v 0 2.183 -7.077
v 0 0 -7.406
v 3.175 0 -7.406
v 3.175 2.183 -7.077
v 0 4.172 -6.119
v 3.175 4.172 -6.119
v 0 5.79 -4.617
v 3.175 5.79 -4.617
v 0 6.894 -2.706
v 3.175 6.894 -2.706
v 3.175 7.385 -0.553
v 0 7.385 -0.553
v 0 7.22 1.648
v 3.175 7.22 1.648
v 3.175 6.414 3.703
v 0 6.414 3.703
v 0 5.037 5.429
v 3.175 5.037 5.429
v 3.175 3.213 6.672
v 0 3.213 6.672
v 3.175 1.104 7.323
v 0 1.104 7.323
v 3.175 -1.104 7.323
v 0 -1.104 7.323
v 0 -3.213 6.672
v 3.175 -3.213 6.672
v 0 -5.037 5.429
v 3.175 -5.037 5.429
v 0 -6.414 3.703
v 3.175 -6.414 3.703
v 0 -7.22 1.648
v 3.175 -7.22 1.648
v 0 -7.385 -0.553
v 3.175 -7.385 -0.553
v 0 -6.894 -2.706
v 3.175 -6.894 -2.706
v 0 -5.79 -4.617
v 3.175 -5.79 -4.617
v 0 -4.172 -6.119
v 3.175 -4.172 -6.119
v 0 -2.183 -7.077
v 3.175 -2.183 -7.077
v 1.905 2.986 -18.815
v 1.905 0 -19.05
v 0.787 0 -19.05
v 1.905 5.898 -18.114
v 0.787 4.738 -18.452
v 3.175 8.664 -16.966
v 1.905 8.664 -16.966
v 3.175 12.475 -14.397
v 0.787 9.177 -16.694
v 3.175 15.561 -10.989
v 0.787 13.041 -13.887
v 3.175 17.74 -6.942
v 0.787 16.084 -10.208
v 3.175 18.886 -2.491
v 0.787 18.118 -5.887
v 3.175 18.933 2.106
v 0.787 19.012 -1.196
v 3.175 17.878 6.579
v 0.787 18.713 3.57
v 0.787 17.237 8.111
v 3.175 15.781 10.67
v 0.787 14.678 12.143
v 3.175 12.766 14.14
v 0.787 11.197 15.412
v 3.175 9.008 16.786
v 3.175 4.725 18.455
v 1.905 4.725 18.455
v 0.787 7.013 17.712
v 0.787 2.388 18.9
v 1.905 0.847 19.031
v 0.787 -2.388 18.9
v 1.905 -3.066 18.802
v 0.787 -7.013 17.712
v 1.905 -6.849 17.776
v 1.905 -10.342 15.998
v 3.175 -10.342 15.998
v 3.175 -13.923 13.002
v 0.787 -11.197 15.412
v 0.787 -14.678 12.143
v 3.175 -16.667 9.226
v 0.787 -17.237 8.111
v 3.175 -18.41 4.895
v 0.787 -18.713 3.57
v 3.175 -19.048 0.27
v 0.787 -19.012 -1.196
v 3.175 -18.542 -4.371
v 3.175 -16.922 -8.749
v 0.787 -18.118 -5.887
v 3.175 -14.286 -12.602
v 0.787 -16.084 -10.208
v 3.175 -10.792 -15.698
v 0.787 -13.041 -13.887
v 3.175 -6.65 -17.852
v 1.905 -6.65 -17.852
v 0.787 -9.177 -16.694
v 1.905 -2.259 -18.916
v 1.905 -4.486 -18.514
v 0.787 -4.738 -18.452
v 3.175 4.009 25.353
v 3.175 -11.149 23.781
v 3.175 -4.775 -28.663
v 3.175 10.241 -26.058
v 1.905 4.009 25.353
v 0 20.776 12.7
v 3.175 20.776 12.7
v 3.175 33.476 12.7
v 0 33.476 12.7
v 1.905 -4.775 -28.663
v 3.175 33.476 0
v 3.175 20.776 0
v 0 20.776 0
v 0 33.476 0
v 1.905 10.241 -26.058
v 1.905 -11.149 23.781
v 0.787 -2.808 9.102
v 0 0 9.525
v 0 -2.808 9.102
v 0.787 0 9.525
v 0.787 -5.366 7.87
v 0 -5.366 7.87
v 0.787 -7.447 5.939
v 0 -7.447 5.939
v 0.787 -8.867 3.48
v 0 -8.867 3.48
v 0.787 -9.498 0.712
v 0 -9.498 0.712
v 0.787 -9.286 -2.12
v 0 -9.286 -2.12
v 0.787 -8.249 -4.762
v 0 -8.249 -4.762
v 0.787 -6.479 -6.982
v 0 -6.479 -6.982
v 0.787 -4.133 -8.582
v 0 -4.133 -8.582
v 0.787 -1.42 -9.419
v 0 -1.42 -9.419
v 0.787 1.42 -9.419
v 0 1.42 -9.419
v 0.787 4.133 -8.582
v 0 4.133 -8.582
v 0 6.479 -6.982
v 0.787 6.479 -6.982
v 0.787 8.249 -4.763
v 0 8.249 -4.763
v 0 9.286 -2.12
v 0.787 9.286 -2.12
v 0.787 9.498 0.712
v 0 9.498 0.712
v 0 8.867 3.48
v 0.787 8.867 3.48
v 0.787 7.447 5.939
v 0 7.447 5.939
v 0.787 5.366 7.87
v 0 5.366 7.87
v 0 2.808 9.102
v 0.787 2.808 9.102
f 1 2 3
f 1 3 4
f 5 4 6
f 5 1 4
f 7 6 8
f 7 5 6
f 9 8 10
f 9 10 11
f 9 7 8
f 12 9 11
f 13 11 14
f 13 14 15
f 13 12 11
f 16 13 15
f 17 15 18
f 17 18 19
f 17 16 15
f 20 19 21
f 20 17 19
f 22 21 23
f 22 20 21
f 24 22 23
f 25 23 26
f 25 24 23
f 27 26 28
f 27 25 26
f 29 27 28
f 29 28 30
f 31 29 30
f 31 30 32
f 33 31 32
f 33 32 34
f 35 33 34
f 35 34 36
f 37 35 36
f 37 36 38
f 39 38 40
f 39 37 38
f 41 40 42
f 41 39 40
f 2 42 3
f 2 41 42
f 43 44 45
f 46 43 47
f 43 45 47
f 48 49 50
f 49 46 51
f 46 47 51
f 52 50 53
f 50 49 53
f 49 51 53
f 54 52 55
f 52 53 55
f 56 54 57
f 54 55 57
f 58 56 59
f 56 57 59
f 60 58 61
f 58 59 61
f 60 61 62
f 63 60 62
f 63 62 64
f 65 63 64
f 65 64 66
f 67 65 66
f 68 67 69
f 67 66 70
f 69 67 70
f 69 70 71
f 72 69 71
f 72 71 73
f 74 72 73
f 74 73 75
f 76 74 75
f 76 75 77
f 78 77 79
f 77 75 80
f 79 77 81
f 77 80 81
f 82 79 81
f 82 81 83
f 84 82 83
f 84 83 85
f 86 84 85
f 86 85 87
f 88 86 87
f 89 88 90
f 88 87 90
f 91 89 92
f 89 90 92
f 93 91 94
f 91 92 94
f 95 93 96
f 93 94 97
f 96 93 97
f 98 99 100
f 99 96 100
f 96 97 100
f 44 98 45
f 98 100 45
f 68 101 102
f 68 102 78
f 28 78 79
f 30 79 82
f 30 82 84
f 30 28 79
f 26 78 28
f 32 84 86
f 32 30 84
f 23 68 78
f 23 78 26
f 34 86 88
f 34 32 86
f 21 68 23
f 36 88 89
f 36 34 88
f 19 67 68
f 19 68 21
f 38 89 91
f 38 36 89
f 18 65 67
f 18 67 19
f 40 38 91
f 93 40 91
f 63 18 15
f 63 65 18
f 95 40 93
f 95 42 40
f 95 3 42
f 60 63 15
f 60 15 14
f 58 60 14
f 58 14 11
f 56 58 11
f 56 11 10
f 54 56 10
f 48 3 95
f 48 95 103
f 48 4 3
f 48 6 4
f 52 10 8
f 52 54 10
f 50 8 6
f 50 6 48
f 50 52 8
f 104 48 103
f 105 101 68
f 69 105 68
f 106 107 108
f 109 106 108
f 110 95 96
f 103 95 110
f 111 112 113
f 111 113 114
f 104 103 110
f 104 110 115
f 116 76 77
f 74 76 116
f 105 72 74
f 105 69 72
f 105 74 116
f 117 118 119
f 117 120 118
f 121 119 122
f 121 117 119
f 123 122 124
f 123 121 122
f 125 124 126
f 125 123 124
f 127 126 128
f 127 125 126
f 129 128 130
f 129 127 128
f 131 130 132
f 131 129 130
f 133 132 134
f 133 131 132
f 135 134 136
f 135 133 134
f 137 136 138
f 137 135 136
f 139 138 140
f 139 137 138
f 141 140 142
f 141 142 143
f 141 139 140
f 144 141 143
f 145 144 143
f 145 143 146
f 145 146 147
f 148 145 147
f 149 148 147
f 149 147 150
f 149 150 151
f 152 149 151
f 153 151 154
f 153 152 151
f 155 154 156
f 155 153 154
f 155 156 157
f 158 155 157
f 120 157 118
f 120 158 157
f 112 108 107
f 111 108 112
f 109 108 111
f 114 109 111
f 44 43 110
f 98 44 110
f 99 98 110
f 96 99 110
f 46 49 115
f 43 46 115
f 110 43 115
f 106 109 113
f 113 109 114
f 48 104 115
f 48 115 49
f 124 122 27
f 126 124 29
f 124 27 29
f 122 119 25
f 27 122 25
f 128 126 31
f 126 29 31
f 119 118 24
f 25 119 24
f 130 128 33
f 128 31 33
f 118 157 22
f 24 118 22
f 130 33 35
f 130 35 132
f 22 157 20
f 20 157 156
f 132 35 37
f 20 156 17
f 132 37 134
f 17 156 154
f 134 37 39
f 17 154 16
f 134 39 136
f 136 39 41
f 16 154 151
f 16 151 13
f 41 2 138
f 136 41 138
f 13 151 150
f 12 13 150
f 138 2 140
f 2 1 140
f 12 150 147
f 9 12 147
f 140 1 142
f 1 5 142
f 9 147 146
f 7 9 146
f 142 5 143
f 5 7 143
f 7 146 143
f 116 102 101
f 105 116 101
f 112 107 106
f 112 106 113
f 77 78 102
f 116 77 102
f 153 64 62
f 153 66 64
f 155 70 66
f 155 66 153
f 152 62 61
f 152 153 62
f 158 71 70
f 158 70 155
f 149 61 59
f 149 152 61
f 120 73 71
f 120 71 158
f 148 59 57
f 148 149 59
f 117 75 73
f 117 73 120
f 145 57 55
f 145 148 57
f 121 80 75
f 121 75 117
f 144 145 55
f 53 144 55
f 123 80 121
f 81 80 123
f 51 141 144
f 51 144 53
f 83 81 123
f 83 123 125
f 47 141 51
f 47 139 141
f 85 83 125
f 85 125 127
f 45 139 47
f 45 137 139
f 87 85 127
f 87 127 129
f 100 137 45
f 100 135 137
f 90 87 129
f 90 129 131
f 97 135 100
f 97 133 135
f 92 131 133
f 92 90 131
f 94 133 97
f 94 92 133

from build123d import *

# Parameters (mm, degrees)
SKETCH1_R           = 19.05
SKETCH1_R_2         = 7.405671903
BOSS_EXTRUDE1_DEPTH = 3.175
SKETCH3_W           = 0.7874
SKETCH3_H           = 9.525
SKETCH4_W           = 12.7
SKETCH4_H           = 12.7
BOSS_EXTRUDE2_DEPTH = 3.175
BOSS_EXTRUDE3_DEPTH = 1.27


with BuildPart() as part:
    # Sketch1 → Boss-Extrude1 (new body)
    with BuildSketch(Plane(origin=(0, 0, 0), x_dir=(0, 0, -1), z_dir=(1, 0, 0))):
        Circle(SKETCH1_R)
        Circle(SKETCH1_R_2, mode=Mode.SUBTRACT)
    extrude(amount=BOSS_EXTRUDE1_DEPTH)

    # Sketch3 → Cut-Revolve1 (revolve, cut)
    with BuildSketch(Plane.XY, mode=Mode.PRIVATE) as cut_revolve1_sk:
        with Locations((0.3937, 14.2875)):
            Rectangle(SKETCH3_W, SKETCH3_H)
    revolve(cut_revolve1_sk.sketch.rotate(Axis((0, 0, 0), (1, 0, 0)), 90), axis=Axis((0, 0, 0), (1, 0, 0)), mode=Mode.SUBTRACT)

    # Sketch5 → Boss-Extrude3 (add)
    with BuildSketch(Plane(origin=(3.175, 0, 0), x_dir=(0, 0, -1), z_dir=(1, 0, 0))):
        Polygon((12.603193196, 7.906953093), (15.207933879, -7.108802831), (28.663115508, -4.774770556), (26.058374826, 10.240985369), align=None)
        Polygon((-14.91337831, 5.091744809), (-13.341601287, -10.066985909), (-23.781025765, -11.149427957), (-25.352802787, 4.009302762), align=None)
    extrude(amount=-BOSS_EXTRUDE3_DEPTH)


with BuildPart() as body_2:
    # Sketch4 → Boss-Extrude2 (new body)
    with BuildSketch(Plane(origin=(3.175, 0, 0), x_dir=(0, 0, -1), z_dir=(1, 0, 0))):
        with Locations((-6.35, 27.126355703)):
            Rectangle(SKETCH4_W, SKETCH4_H)
    extrude(amount=-BOSS_EXTRUDE2_DEPTH)


solid = Compound([part.part, body_2.part])
